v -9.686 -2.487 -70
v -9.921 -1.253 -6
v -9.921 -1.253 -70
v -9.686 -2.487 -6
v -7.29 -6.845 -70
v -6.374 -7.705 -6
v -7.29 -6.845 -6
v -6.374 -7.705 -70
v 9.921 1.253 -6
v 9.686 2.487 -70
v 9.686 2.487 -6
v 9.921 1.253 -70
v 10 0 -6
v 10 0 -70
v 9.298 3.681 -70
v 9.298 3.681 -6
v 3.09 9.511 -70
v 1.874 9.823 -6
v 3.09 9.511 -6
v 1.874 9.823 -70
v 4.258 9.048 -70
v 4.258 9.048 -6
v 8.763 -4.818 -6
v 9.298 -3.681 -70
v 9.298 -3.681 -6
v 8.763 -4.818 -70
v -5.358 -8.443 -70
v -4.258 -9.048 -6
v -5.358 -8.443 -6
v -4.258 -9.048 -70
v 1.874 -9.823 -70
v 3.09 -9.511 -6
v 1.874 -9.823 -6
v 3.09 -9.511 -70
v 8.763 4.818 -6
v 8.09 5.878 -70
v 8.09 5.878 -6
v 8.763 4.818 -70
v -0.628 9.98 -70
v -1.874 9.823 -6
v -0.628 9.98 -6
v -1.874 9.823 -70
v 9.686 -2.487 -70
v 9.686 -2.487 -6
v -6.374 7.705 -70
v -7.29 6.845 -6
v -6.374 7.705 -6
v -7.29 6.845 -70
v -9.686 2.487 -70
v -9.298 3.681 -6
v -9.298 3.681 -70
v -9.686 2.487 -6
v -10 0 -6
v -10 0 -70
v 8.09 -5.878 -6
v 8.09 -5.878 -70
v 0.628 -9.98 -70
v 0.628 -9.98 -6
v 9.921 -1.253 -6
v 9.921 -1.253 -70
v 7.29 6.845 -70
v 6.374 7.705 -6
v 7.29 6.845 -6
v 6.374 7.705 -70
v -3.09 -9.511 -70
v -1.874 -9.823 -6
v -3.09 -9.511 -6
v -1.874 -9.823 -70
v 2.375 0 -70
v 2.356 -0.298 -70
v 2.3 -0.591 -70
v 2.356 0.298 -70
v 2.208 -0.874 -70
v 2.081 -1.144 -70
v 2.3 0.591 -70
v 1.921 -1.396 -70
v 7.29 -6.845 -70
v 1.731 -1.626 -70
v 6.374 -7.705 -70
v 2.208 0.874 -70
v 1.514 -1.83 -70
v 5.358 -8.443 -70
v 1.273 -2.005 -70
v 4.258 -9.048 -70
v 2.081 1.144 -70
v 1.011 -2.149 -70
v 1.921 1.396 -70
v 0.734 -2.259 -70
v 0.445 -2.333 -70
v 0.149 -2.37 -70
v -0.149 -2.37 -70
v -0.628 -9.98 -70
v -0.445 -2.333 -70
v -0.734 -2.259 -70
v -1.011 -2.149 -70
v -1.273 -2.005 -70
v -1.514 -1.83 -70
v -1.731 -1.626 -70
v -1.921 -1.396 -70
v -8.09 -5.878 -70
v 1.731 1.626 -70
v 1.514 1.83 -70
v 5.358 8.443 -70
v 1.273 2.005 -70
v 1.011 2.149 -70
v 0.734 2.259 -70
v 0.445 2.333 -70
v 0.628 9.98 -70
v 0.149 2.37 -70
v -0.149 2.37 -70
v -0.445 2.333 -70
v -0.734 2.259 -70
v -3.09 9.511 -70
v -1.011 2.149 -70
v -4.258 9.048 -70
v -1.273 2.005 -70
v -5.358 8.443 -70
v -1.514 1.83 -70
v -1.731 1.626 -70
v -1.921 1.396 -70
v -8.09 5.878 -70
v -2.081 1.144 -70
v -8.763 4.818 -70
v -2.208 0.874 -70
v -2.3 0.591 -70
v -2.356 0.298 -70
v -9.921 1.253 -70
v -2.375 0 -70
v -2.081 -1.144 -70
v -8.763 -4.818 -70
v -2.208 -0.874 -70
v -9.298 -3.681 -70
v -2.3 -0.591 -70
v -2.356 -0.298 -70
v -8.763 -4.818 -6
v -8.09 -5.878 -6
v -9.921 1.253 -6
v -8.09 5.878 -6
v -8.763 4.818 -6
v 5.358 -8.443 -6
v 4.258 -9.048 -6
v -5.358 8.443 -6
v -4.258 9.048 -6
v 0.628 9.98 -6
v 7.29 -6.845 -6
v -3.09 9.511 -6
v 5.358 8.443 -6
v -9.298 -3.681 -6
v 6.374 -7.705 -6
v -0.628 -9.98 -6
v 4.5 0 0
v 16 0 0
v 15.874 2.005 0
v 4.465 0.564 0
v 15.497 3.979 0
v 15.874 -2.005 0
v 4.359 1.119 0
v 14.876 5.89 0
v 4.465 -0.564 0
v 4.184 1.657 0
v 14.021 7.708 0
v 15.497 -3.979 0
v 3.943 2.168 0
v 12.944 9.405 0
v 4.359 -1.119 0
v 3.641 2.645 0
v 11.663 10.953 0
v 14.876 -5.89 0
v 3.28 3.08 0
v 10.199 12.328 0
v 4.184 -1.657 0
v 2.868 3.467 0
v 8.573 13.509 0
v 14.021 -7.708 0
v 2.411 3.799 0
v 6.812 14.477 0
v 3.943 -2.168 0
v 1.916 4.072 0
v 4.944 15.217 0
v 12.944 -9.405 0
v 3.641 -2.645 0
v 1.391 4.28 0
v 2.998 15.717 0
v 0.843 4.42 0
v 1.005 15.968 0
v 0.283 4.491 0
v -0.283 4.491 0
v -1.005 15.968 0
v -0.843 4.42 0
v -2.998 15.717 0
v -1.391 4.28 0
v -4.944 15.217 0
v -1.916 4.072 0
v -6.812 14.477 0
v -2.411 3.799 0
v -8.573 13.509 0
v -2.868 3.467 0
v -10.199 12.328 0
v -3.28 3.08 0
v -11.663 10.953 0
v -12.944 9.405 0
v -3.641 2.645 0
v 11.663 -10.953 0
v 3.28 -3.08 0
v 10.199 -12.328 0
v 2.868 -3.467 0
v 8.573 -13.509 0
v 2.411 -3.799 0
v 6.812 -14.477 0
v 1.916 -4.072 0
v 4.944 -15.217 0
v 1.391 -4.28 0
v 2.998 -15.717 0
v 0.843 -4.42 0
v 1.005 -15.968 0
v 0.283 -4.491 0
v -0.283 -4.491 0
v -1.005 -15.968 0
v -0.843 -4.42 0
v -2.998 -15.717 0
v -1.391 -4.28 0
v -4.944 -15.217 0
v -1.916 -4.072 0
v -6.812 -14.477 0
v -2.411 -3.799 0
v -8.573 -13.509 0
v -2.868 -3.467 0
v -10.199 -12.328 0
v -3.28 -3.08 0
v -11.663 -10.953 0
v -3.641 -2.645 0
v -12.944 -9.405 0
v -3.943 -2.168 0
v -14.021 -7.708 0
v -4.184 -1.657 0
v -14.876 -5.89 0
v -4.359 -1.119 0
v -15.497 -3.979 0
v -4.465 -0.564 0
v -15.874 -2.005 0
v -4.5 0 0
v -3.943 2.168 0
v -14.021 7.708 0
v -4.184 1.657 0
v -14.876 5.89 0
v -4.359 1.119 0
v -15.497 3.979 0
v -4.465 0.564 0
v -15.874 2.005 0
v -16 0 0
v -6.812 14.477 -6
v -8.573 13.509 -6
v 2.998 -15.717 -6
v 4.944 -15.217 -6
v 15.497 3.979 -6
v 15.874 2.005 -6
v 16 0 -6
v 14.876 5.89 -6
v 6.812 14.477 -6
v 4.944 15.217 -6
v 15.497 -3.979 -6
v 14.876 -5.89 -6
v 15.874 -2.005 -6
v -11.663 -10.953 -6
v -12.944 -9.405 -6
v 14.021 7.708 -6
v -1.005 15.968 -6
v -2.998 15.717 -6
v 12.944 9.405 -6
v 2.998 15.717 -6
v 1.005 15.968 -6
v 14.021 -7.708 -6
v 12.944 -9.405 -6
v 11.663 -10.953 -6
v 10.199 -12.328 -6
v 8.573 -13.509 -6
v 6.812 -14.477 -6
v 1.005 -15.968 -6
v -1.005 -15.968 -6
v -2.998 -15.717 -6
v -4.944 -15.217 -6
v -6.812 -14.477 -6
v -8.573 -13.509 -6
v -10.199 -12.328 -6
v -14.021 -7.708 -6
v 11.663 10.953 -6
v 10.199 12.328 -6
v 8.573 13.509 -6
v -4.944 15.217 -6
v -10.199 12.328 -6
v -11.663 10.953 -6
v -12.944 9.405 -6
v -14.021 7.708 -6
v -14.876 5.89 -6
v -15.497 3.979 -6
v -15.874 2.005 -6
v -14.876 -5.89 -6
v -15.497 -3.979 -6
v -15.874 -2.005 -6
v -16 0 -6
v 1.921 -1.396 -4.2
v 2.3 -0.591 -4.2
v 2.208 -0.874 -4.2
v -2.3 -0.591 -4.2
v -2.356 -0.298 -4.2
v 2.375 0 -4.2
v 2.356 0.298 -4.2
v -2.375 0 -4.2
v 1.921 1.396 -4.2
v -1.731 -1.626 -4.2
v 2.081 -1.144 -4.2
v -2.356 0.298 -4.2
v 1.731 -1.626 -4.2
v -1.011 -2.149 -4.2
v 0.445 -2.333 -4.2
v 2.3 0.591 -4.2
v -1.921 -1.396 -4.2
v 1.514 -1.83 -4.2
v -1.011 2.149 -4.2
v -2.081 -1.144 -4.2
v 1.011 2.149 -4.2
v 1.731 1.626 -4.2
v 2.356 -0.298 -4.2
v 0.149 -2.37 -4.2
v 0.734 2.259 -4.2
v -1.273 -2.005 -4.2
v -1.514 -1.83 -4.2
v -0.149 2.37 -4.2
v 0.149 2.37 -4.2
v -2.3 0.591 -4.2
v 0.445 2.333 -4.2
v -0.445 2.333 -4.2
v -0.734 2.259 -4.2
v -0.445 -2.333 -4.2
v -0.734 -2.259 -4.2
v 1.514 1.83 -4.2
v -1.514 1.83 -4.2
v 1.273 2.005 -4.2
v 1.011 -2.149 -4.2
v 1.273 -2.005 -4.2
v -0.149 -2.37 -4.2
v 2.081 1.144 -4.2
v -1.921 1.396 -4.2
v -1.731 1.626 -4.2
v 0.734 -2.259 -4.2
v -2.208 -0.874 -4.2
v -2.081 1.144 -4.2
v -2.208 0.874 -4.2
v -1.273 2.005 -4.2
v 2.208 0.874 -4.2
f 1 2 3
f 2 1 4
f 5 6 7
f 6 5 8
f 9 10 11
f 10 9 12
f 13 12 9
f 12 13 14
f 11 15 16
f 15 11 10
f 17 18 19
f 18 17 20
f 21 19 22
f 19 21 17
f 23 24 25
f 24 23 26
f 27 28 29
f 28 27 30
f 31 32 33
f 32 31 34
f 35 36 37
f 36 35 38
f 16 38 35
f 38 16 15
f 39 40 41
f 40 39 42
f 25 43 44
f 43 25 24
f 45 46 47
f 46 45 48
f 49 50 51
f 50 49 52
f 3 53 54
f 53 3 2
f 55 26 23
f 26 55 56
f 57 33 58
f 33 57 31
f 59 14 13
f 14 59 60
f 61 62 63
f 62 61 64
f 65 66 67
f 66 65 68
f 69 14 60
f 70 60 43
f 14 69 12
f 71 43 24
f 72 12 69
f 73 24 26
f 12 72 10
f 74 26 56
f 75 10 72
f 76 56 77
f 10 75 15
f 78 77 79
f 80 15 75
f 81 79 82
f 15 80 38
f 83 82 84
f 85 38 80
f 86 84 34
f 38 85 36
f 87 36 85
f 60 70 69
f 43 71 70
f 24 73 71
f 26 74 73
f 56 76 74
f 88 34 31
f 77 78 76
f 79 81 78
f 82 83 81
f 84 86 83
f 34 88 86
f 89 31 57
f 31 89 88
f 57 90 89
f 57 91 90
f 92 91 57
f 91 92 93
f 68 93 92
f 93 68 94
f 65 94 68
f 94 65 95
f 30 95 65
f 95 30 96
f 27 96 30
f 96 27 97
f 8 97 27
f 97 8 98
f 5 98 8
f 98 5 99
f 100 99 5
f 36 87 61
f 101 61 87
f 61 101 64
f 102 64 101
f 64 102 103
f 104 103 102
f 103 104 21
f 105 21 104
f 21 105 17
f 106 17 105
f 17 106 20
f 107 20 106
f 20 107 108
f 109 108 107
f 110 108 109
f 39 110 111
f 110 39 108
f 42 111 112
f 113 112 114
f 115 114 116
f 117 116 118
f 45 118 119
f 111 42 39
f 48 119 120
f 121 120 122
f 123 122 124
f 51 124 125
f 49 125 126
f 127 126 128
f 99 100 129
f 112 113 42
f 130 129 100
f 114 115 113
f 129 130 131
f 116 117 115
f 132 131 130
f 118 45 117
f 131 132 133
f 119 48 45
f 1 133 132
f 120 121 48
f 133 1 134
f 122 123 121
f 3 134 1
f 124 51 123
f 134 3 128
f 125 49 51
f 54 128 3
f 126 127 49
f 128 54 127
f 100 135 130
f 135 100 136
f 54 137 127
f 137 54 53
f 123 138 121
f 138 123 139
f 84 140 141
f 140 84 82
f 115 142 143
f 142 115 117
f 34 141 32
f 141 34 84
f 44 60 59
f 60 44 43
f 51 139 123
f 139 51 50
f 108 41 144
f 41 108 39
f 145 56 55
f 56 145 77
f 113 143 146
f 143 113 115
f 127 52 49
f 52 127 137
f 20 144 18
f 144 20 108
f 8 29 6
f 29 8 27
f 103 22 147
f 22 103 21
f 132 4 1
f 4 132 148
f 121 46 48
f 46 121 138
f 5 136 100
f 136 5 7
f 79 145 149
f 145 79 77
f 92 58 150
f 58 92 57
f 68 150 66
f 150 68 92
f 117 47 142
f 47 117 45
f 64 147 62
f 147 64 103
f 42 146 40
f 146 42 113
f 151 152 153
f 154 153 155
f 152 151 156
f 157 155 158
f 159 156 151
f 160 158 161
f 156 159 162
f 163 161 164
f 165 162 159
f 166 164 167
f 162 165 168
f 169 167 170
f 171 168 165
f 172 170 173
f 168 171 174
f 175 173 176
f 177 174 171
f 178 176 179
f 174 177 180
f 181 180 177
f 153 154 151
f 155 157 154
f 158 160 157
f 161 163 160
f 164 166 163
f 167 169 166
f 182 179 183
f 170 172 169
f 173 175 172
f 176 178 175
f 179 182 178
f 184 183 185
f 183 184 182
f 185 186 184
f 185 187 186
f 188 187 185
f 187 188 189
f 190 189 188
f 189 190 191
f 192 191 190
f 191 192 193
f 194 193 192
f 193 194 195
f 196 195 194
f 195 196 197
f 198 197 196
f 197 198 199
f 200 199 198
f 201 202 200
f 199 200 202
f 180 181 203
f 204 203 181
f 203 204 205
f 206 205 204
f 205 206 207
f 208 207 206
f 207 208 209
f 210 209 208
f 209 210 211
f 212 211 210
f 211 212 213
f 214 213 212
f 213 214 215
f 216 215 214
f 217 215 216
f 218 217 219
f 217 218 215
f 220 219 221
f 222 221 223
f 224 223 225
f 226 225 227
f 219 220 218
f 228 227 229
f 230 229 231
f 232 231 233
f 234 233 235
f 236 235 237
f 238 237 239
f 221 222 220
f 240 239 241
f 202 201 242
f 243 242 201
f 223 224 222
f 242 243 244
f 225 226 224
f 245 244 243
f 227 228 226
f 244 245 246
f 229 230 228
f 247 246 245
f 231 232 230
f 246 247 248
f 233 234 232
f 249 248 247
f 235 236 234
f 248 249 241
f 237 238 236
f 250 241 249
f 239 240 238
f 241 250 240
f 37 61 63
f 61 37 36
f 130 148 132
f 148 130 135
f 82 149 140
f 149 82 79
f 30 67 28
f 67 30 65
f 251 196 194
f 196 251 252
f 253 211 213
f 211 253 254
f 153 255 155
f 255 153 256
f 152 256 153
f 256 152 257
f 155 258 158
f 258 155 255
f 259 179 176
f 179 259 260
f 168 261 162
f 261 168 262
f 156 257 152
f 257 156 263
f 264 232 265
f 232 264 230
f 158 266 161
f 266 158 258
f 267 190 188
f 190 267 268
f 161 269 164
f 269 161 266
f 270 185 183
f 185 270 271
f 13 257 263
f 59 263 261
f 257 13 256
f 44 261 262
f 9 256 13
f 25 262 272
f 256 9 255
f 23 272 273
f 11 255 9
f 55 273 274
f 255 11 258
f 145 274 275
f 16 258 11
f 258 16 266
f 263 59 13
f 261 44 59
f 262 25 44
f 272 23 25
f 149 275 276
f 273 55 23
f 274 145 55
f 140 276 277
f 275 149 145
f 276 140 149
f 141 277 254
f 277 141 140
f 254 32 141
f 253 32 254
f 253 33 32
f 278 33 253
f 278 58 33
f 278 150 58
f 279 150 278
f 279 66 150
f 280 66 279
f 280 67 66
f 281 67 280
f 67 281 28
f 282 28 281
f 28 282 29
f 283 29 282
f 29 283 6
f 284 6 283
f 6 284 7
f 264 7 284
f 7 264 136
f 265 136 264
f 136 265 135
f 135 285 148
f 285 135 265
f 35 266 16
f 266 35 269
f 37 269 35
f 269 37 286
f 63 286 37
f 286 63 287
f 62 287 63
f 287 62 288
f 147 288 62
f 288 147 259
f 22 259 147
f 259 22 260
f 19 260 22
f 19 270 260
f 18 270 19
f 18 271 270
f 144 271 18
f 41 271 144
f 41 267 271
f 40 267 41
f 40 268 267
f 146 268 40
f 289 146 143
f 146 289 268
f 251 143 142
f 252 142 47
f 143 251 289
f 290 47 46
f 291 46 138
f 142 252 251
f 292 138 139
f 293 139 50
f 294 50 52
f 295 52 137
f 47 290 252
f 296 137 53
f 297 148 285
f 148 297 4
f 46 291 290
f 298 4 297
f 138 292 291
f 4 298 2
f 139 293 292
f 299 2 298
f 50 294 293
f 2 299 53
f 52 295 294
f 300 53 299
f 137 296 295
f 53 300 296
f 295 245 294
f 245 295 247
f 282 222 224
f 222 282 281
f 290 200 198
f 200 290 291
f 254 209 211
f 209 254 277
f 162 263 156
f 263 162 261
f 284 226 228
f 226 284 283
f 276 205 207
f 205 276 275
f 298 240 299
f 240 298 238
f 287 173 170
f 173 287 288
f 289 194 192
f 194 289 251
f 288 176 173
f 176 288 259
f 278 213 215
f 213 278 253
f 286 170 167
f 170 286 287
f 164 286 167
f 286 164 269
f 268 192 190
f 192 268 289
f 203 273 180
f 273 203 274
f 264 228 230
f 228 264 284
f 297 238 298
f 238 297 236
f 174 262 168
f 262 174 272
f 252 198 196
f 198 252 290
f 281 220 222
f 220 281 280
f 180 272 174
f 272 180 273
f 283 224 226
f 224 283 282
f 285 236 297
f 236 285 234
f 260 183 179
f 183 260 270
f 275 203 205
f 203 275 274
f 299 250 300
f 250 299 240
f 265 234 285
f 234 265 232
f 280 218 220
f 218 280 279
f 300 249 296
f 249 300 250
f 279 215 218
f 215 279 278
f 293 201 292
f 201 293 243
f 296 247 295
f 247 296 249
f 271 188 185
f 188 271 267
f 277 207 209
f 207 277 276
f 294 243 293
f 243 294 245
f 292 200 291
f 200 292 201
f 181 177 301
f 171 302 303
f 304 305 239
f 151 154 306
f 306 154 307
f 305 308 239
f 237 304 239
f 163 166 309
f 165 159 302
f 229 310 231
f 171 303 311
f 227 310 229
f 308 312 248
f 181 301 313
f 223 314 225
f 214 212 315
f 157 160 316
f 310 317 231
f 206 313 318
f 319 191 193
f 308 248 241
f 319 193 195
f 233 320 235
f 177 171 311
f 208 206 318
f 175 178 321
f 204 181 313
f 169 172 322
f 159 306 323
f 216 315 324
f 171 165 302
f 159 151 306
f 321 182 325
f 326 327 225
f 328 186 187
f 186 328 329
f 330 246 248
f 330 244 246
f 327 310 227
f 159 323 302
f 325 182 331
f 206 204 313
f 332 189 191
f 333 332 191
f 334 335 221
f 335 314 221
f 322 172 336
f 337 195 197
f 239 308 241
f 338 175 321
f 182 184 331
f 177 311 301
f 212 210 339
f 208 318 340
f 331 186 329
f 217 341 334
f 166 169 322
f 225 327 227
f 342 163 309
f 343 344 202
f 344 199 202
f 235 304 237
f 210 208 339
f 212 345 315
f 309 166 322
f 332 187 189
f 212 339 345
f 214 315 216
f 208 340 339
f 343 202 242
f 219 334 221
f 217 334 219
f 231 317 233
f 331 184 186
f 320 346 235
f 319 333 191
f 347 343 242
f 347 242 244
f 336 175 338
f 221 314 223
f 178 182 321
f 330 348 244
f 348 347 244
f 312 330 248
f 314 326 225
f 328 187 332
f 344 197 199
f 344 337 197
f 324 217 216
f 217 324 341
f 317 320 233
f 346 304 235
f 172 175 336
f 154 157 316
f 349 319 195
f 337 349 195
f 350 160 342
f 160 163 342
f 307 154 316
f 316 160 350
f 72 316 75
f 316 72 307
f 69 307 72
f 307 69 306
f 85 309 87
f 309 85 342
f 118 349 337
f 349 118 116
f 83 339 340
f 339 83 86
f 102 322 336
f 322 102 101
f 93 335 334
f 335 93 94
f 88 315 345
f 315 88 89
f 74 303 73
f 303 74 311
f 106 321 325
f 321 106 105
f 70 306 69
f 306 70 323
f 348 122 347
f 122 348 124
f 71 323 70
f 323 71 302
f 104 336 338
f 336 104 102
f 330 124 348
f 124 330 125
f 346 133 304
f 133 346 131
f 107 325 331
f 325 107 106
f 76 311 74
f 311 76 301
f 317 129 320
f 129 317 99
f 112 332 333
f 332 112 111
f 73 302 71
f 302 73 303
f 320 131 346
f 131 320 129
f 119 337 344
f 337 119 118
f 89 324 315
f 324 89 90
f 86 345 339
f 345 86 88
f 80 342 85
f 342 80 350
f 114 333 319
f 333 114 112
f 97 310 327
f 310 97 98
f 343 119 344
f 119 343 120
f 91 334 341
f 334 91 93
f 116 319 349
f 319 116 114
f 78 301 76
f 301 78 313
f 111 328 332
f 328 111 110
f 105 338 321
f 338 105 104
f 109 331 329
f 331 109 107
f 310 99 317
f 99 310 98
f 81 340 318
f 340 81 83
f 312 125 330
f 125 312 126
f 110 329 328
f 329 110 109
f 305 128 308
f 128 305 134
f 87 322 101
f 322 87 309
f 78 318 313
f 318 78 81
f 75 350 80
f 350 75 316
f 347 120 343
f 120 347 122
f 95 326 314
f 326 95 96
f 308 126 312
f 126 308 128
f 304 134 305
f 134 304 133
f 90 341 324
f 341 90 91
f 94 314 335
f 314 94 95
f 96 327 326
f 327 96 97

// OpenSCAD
$fn = 50;


difference() {
	union() {
		translate(v = [0, 0, -70.0000000000]) {
			cylinder(h = 70, r = 10.0000000000);
		}
		translate(v = [0, 0, -6.0000000000]) {
			cylinder(h = 6, r = 16.0000000000);
		}
	}
	union() {
		translate(v = [0, 0, 0]) {
			rotate(a = [0, 0, 0]) {
				difference() {
					union() {
						#translate(v = [0, 0, -70.0000000000]) {
							cylinder(h = 70, r = 2.2500000000);
						}
						#translate(v = [0, 0, -4.2000000000]) {
							cylinder(h = 4.2000000000, r = 10.0000000000, r1 = 2.3750000000, r2 = 4.5000000000);
						}
						#translate(v = [0, 0, -70.0000000000]) {
							cylinder(h = 70, r = 2.3750000000);
						}
						#translate(v = [0, 0, -70.0000000000]) {
							cylinder(h = 70, r = 2.2500000000);
						}
					}
					union();
				}
			}
		}
	}
}
